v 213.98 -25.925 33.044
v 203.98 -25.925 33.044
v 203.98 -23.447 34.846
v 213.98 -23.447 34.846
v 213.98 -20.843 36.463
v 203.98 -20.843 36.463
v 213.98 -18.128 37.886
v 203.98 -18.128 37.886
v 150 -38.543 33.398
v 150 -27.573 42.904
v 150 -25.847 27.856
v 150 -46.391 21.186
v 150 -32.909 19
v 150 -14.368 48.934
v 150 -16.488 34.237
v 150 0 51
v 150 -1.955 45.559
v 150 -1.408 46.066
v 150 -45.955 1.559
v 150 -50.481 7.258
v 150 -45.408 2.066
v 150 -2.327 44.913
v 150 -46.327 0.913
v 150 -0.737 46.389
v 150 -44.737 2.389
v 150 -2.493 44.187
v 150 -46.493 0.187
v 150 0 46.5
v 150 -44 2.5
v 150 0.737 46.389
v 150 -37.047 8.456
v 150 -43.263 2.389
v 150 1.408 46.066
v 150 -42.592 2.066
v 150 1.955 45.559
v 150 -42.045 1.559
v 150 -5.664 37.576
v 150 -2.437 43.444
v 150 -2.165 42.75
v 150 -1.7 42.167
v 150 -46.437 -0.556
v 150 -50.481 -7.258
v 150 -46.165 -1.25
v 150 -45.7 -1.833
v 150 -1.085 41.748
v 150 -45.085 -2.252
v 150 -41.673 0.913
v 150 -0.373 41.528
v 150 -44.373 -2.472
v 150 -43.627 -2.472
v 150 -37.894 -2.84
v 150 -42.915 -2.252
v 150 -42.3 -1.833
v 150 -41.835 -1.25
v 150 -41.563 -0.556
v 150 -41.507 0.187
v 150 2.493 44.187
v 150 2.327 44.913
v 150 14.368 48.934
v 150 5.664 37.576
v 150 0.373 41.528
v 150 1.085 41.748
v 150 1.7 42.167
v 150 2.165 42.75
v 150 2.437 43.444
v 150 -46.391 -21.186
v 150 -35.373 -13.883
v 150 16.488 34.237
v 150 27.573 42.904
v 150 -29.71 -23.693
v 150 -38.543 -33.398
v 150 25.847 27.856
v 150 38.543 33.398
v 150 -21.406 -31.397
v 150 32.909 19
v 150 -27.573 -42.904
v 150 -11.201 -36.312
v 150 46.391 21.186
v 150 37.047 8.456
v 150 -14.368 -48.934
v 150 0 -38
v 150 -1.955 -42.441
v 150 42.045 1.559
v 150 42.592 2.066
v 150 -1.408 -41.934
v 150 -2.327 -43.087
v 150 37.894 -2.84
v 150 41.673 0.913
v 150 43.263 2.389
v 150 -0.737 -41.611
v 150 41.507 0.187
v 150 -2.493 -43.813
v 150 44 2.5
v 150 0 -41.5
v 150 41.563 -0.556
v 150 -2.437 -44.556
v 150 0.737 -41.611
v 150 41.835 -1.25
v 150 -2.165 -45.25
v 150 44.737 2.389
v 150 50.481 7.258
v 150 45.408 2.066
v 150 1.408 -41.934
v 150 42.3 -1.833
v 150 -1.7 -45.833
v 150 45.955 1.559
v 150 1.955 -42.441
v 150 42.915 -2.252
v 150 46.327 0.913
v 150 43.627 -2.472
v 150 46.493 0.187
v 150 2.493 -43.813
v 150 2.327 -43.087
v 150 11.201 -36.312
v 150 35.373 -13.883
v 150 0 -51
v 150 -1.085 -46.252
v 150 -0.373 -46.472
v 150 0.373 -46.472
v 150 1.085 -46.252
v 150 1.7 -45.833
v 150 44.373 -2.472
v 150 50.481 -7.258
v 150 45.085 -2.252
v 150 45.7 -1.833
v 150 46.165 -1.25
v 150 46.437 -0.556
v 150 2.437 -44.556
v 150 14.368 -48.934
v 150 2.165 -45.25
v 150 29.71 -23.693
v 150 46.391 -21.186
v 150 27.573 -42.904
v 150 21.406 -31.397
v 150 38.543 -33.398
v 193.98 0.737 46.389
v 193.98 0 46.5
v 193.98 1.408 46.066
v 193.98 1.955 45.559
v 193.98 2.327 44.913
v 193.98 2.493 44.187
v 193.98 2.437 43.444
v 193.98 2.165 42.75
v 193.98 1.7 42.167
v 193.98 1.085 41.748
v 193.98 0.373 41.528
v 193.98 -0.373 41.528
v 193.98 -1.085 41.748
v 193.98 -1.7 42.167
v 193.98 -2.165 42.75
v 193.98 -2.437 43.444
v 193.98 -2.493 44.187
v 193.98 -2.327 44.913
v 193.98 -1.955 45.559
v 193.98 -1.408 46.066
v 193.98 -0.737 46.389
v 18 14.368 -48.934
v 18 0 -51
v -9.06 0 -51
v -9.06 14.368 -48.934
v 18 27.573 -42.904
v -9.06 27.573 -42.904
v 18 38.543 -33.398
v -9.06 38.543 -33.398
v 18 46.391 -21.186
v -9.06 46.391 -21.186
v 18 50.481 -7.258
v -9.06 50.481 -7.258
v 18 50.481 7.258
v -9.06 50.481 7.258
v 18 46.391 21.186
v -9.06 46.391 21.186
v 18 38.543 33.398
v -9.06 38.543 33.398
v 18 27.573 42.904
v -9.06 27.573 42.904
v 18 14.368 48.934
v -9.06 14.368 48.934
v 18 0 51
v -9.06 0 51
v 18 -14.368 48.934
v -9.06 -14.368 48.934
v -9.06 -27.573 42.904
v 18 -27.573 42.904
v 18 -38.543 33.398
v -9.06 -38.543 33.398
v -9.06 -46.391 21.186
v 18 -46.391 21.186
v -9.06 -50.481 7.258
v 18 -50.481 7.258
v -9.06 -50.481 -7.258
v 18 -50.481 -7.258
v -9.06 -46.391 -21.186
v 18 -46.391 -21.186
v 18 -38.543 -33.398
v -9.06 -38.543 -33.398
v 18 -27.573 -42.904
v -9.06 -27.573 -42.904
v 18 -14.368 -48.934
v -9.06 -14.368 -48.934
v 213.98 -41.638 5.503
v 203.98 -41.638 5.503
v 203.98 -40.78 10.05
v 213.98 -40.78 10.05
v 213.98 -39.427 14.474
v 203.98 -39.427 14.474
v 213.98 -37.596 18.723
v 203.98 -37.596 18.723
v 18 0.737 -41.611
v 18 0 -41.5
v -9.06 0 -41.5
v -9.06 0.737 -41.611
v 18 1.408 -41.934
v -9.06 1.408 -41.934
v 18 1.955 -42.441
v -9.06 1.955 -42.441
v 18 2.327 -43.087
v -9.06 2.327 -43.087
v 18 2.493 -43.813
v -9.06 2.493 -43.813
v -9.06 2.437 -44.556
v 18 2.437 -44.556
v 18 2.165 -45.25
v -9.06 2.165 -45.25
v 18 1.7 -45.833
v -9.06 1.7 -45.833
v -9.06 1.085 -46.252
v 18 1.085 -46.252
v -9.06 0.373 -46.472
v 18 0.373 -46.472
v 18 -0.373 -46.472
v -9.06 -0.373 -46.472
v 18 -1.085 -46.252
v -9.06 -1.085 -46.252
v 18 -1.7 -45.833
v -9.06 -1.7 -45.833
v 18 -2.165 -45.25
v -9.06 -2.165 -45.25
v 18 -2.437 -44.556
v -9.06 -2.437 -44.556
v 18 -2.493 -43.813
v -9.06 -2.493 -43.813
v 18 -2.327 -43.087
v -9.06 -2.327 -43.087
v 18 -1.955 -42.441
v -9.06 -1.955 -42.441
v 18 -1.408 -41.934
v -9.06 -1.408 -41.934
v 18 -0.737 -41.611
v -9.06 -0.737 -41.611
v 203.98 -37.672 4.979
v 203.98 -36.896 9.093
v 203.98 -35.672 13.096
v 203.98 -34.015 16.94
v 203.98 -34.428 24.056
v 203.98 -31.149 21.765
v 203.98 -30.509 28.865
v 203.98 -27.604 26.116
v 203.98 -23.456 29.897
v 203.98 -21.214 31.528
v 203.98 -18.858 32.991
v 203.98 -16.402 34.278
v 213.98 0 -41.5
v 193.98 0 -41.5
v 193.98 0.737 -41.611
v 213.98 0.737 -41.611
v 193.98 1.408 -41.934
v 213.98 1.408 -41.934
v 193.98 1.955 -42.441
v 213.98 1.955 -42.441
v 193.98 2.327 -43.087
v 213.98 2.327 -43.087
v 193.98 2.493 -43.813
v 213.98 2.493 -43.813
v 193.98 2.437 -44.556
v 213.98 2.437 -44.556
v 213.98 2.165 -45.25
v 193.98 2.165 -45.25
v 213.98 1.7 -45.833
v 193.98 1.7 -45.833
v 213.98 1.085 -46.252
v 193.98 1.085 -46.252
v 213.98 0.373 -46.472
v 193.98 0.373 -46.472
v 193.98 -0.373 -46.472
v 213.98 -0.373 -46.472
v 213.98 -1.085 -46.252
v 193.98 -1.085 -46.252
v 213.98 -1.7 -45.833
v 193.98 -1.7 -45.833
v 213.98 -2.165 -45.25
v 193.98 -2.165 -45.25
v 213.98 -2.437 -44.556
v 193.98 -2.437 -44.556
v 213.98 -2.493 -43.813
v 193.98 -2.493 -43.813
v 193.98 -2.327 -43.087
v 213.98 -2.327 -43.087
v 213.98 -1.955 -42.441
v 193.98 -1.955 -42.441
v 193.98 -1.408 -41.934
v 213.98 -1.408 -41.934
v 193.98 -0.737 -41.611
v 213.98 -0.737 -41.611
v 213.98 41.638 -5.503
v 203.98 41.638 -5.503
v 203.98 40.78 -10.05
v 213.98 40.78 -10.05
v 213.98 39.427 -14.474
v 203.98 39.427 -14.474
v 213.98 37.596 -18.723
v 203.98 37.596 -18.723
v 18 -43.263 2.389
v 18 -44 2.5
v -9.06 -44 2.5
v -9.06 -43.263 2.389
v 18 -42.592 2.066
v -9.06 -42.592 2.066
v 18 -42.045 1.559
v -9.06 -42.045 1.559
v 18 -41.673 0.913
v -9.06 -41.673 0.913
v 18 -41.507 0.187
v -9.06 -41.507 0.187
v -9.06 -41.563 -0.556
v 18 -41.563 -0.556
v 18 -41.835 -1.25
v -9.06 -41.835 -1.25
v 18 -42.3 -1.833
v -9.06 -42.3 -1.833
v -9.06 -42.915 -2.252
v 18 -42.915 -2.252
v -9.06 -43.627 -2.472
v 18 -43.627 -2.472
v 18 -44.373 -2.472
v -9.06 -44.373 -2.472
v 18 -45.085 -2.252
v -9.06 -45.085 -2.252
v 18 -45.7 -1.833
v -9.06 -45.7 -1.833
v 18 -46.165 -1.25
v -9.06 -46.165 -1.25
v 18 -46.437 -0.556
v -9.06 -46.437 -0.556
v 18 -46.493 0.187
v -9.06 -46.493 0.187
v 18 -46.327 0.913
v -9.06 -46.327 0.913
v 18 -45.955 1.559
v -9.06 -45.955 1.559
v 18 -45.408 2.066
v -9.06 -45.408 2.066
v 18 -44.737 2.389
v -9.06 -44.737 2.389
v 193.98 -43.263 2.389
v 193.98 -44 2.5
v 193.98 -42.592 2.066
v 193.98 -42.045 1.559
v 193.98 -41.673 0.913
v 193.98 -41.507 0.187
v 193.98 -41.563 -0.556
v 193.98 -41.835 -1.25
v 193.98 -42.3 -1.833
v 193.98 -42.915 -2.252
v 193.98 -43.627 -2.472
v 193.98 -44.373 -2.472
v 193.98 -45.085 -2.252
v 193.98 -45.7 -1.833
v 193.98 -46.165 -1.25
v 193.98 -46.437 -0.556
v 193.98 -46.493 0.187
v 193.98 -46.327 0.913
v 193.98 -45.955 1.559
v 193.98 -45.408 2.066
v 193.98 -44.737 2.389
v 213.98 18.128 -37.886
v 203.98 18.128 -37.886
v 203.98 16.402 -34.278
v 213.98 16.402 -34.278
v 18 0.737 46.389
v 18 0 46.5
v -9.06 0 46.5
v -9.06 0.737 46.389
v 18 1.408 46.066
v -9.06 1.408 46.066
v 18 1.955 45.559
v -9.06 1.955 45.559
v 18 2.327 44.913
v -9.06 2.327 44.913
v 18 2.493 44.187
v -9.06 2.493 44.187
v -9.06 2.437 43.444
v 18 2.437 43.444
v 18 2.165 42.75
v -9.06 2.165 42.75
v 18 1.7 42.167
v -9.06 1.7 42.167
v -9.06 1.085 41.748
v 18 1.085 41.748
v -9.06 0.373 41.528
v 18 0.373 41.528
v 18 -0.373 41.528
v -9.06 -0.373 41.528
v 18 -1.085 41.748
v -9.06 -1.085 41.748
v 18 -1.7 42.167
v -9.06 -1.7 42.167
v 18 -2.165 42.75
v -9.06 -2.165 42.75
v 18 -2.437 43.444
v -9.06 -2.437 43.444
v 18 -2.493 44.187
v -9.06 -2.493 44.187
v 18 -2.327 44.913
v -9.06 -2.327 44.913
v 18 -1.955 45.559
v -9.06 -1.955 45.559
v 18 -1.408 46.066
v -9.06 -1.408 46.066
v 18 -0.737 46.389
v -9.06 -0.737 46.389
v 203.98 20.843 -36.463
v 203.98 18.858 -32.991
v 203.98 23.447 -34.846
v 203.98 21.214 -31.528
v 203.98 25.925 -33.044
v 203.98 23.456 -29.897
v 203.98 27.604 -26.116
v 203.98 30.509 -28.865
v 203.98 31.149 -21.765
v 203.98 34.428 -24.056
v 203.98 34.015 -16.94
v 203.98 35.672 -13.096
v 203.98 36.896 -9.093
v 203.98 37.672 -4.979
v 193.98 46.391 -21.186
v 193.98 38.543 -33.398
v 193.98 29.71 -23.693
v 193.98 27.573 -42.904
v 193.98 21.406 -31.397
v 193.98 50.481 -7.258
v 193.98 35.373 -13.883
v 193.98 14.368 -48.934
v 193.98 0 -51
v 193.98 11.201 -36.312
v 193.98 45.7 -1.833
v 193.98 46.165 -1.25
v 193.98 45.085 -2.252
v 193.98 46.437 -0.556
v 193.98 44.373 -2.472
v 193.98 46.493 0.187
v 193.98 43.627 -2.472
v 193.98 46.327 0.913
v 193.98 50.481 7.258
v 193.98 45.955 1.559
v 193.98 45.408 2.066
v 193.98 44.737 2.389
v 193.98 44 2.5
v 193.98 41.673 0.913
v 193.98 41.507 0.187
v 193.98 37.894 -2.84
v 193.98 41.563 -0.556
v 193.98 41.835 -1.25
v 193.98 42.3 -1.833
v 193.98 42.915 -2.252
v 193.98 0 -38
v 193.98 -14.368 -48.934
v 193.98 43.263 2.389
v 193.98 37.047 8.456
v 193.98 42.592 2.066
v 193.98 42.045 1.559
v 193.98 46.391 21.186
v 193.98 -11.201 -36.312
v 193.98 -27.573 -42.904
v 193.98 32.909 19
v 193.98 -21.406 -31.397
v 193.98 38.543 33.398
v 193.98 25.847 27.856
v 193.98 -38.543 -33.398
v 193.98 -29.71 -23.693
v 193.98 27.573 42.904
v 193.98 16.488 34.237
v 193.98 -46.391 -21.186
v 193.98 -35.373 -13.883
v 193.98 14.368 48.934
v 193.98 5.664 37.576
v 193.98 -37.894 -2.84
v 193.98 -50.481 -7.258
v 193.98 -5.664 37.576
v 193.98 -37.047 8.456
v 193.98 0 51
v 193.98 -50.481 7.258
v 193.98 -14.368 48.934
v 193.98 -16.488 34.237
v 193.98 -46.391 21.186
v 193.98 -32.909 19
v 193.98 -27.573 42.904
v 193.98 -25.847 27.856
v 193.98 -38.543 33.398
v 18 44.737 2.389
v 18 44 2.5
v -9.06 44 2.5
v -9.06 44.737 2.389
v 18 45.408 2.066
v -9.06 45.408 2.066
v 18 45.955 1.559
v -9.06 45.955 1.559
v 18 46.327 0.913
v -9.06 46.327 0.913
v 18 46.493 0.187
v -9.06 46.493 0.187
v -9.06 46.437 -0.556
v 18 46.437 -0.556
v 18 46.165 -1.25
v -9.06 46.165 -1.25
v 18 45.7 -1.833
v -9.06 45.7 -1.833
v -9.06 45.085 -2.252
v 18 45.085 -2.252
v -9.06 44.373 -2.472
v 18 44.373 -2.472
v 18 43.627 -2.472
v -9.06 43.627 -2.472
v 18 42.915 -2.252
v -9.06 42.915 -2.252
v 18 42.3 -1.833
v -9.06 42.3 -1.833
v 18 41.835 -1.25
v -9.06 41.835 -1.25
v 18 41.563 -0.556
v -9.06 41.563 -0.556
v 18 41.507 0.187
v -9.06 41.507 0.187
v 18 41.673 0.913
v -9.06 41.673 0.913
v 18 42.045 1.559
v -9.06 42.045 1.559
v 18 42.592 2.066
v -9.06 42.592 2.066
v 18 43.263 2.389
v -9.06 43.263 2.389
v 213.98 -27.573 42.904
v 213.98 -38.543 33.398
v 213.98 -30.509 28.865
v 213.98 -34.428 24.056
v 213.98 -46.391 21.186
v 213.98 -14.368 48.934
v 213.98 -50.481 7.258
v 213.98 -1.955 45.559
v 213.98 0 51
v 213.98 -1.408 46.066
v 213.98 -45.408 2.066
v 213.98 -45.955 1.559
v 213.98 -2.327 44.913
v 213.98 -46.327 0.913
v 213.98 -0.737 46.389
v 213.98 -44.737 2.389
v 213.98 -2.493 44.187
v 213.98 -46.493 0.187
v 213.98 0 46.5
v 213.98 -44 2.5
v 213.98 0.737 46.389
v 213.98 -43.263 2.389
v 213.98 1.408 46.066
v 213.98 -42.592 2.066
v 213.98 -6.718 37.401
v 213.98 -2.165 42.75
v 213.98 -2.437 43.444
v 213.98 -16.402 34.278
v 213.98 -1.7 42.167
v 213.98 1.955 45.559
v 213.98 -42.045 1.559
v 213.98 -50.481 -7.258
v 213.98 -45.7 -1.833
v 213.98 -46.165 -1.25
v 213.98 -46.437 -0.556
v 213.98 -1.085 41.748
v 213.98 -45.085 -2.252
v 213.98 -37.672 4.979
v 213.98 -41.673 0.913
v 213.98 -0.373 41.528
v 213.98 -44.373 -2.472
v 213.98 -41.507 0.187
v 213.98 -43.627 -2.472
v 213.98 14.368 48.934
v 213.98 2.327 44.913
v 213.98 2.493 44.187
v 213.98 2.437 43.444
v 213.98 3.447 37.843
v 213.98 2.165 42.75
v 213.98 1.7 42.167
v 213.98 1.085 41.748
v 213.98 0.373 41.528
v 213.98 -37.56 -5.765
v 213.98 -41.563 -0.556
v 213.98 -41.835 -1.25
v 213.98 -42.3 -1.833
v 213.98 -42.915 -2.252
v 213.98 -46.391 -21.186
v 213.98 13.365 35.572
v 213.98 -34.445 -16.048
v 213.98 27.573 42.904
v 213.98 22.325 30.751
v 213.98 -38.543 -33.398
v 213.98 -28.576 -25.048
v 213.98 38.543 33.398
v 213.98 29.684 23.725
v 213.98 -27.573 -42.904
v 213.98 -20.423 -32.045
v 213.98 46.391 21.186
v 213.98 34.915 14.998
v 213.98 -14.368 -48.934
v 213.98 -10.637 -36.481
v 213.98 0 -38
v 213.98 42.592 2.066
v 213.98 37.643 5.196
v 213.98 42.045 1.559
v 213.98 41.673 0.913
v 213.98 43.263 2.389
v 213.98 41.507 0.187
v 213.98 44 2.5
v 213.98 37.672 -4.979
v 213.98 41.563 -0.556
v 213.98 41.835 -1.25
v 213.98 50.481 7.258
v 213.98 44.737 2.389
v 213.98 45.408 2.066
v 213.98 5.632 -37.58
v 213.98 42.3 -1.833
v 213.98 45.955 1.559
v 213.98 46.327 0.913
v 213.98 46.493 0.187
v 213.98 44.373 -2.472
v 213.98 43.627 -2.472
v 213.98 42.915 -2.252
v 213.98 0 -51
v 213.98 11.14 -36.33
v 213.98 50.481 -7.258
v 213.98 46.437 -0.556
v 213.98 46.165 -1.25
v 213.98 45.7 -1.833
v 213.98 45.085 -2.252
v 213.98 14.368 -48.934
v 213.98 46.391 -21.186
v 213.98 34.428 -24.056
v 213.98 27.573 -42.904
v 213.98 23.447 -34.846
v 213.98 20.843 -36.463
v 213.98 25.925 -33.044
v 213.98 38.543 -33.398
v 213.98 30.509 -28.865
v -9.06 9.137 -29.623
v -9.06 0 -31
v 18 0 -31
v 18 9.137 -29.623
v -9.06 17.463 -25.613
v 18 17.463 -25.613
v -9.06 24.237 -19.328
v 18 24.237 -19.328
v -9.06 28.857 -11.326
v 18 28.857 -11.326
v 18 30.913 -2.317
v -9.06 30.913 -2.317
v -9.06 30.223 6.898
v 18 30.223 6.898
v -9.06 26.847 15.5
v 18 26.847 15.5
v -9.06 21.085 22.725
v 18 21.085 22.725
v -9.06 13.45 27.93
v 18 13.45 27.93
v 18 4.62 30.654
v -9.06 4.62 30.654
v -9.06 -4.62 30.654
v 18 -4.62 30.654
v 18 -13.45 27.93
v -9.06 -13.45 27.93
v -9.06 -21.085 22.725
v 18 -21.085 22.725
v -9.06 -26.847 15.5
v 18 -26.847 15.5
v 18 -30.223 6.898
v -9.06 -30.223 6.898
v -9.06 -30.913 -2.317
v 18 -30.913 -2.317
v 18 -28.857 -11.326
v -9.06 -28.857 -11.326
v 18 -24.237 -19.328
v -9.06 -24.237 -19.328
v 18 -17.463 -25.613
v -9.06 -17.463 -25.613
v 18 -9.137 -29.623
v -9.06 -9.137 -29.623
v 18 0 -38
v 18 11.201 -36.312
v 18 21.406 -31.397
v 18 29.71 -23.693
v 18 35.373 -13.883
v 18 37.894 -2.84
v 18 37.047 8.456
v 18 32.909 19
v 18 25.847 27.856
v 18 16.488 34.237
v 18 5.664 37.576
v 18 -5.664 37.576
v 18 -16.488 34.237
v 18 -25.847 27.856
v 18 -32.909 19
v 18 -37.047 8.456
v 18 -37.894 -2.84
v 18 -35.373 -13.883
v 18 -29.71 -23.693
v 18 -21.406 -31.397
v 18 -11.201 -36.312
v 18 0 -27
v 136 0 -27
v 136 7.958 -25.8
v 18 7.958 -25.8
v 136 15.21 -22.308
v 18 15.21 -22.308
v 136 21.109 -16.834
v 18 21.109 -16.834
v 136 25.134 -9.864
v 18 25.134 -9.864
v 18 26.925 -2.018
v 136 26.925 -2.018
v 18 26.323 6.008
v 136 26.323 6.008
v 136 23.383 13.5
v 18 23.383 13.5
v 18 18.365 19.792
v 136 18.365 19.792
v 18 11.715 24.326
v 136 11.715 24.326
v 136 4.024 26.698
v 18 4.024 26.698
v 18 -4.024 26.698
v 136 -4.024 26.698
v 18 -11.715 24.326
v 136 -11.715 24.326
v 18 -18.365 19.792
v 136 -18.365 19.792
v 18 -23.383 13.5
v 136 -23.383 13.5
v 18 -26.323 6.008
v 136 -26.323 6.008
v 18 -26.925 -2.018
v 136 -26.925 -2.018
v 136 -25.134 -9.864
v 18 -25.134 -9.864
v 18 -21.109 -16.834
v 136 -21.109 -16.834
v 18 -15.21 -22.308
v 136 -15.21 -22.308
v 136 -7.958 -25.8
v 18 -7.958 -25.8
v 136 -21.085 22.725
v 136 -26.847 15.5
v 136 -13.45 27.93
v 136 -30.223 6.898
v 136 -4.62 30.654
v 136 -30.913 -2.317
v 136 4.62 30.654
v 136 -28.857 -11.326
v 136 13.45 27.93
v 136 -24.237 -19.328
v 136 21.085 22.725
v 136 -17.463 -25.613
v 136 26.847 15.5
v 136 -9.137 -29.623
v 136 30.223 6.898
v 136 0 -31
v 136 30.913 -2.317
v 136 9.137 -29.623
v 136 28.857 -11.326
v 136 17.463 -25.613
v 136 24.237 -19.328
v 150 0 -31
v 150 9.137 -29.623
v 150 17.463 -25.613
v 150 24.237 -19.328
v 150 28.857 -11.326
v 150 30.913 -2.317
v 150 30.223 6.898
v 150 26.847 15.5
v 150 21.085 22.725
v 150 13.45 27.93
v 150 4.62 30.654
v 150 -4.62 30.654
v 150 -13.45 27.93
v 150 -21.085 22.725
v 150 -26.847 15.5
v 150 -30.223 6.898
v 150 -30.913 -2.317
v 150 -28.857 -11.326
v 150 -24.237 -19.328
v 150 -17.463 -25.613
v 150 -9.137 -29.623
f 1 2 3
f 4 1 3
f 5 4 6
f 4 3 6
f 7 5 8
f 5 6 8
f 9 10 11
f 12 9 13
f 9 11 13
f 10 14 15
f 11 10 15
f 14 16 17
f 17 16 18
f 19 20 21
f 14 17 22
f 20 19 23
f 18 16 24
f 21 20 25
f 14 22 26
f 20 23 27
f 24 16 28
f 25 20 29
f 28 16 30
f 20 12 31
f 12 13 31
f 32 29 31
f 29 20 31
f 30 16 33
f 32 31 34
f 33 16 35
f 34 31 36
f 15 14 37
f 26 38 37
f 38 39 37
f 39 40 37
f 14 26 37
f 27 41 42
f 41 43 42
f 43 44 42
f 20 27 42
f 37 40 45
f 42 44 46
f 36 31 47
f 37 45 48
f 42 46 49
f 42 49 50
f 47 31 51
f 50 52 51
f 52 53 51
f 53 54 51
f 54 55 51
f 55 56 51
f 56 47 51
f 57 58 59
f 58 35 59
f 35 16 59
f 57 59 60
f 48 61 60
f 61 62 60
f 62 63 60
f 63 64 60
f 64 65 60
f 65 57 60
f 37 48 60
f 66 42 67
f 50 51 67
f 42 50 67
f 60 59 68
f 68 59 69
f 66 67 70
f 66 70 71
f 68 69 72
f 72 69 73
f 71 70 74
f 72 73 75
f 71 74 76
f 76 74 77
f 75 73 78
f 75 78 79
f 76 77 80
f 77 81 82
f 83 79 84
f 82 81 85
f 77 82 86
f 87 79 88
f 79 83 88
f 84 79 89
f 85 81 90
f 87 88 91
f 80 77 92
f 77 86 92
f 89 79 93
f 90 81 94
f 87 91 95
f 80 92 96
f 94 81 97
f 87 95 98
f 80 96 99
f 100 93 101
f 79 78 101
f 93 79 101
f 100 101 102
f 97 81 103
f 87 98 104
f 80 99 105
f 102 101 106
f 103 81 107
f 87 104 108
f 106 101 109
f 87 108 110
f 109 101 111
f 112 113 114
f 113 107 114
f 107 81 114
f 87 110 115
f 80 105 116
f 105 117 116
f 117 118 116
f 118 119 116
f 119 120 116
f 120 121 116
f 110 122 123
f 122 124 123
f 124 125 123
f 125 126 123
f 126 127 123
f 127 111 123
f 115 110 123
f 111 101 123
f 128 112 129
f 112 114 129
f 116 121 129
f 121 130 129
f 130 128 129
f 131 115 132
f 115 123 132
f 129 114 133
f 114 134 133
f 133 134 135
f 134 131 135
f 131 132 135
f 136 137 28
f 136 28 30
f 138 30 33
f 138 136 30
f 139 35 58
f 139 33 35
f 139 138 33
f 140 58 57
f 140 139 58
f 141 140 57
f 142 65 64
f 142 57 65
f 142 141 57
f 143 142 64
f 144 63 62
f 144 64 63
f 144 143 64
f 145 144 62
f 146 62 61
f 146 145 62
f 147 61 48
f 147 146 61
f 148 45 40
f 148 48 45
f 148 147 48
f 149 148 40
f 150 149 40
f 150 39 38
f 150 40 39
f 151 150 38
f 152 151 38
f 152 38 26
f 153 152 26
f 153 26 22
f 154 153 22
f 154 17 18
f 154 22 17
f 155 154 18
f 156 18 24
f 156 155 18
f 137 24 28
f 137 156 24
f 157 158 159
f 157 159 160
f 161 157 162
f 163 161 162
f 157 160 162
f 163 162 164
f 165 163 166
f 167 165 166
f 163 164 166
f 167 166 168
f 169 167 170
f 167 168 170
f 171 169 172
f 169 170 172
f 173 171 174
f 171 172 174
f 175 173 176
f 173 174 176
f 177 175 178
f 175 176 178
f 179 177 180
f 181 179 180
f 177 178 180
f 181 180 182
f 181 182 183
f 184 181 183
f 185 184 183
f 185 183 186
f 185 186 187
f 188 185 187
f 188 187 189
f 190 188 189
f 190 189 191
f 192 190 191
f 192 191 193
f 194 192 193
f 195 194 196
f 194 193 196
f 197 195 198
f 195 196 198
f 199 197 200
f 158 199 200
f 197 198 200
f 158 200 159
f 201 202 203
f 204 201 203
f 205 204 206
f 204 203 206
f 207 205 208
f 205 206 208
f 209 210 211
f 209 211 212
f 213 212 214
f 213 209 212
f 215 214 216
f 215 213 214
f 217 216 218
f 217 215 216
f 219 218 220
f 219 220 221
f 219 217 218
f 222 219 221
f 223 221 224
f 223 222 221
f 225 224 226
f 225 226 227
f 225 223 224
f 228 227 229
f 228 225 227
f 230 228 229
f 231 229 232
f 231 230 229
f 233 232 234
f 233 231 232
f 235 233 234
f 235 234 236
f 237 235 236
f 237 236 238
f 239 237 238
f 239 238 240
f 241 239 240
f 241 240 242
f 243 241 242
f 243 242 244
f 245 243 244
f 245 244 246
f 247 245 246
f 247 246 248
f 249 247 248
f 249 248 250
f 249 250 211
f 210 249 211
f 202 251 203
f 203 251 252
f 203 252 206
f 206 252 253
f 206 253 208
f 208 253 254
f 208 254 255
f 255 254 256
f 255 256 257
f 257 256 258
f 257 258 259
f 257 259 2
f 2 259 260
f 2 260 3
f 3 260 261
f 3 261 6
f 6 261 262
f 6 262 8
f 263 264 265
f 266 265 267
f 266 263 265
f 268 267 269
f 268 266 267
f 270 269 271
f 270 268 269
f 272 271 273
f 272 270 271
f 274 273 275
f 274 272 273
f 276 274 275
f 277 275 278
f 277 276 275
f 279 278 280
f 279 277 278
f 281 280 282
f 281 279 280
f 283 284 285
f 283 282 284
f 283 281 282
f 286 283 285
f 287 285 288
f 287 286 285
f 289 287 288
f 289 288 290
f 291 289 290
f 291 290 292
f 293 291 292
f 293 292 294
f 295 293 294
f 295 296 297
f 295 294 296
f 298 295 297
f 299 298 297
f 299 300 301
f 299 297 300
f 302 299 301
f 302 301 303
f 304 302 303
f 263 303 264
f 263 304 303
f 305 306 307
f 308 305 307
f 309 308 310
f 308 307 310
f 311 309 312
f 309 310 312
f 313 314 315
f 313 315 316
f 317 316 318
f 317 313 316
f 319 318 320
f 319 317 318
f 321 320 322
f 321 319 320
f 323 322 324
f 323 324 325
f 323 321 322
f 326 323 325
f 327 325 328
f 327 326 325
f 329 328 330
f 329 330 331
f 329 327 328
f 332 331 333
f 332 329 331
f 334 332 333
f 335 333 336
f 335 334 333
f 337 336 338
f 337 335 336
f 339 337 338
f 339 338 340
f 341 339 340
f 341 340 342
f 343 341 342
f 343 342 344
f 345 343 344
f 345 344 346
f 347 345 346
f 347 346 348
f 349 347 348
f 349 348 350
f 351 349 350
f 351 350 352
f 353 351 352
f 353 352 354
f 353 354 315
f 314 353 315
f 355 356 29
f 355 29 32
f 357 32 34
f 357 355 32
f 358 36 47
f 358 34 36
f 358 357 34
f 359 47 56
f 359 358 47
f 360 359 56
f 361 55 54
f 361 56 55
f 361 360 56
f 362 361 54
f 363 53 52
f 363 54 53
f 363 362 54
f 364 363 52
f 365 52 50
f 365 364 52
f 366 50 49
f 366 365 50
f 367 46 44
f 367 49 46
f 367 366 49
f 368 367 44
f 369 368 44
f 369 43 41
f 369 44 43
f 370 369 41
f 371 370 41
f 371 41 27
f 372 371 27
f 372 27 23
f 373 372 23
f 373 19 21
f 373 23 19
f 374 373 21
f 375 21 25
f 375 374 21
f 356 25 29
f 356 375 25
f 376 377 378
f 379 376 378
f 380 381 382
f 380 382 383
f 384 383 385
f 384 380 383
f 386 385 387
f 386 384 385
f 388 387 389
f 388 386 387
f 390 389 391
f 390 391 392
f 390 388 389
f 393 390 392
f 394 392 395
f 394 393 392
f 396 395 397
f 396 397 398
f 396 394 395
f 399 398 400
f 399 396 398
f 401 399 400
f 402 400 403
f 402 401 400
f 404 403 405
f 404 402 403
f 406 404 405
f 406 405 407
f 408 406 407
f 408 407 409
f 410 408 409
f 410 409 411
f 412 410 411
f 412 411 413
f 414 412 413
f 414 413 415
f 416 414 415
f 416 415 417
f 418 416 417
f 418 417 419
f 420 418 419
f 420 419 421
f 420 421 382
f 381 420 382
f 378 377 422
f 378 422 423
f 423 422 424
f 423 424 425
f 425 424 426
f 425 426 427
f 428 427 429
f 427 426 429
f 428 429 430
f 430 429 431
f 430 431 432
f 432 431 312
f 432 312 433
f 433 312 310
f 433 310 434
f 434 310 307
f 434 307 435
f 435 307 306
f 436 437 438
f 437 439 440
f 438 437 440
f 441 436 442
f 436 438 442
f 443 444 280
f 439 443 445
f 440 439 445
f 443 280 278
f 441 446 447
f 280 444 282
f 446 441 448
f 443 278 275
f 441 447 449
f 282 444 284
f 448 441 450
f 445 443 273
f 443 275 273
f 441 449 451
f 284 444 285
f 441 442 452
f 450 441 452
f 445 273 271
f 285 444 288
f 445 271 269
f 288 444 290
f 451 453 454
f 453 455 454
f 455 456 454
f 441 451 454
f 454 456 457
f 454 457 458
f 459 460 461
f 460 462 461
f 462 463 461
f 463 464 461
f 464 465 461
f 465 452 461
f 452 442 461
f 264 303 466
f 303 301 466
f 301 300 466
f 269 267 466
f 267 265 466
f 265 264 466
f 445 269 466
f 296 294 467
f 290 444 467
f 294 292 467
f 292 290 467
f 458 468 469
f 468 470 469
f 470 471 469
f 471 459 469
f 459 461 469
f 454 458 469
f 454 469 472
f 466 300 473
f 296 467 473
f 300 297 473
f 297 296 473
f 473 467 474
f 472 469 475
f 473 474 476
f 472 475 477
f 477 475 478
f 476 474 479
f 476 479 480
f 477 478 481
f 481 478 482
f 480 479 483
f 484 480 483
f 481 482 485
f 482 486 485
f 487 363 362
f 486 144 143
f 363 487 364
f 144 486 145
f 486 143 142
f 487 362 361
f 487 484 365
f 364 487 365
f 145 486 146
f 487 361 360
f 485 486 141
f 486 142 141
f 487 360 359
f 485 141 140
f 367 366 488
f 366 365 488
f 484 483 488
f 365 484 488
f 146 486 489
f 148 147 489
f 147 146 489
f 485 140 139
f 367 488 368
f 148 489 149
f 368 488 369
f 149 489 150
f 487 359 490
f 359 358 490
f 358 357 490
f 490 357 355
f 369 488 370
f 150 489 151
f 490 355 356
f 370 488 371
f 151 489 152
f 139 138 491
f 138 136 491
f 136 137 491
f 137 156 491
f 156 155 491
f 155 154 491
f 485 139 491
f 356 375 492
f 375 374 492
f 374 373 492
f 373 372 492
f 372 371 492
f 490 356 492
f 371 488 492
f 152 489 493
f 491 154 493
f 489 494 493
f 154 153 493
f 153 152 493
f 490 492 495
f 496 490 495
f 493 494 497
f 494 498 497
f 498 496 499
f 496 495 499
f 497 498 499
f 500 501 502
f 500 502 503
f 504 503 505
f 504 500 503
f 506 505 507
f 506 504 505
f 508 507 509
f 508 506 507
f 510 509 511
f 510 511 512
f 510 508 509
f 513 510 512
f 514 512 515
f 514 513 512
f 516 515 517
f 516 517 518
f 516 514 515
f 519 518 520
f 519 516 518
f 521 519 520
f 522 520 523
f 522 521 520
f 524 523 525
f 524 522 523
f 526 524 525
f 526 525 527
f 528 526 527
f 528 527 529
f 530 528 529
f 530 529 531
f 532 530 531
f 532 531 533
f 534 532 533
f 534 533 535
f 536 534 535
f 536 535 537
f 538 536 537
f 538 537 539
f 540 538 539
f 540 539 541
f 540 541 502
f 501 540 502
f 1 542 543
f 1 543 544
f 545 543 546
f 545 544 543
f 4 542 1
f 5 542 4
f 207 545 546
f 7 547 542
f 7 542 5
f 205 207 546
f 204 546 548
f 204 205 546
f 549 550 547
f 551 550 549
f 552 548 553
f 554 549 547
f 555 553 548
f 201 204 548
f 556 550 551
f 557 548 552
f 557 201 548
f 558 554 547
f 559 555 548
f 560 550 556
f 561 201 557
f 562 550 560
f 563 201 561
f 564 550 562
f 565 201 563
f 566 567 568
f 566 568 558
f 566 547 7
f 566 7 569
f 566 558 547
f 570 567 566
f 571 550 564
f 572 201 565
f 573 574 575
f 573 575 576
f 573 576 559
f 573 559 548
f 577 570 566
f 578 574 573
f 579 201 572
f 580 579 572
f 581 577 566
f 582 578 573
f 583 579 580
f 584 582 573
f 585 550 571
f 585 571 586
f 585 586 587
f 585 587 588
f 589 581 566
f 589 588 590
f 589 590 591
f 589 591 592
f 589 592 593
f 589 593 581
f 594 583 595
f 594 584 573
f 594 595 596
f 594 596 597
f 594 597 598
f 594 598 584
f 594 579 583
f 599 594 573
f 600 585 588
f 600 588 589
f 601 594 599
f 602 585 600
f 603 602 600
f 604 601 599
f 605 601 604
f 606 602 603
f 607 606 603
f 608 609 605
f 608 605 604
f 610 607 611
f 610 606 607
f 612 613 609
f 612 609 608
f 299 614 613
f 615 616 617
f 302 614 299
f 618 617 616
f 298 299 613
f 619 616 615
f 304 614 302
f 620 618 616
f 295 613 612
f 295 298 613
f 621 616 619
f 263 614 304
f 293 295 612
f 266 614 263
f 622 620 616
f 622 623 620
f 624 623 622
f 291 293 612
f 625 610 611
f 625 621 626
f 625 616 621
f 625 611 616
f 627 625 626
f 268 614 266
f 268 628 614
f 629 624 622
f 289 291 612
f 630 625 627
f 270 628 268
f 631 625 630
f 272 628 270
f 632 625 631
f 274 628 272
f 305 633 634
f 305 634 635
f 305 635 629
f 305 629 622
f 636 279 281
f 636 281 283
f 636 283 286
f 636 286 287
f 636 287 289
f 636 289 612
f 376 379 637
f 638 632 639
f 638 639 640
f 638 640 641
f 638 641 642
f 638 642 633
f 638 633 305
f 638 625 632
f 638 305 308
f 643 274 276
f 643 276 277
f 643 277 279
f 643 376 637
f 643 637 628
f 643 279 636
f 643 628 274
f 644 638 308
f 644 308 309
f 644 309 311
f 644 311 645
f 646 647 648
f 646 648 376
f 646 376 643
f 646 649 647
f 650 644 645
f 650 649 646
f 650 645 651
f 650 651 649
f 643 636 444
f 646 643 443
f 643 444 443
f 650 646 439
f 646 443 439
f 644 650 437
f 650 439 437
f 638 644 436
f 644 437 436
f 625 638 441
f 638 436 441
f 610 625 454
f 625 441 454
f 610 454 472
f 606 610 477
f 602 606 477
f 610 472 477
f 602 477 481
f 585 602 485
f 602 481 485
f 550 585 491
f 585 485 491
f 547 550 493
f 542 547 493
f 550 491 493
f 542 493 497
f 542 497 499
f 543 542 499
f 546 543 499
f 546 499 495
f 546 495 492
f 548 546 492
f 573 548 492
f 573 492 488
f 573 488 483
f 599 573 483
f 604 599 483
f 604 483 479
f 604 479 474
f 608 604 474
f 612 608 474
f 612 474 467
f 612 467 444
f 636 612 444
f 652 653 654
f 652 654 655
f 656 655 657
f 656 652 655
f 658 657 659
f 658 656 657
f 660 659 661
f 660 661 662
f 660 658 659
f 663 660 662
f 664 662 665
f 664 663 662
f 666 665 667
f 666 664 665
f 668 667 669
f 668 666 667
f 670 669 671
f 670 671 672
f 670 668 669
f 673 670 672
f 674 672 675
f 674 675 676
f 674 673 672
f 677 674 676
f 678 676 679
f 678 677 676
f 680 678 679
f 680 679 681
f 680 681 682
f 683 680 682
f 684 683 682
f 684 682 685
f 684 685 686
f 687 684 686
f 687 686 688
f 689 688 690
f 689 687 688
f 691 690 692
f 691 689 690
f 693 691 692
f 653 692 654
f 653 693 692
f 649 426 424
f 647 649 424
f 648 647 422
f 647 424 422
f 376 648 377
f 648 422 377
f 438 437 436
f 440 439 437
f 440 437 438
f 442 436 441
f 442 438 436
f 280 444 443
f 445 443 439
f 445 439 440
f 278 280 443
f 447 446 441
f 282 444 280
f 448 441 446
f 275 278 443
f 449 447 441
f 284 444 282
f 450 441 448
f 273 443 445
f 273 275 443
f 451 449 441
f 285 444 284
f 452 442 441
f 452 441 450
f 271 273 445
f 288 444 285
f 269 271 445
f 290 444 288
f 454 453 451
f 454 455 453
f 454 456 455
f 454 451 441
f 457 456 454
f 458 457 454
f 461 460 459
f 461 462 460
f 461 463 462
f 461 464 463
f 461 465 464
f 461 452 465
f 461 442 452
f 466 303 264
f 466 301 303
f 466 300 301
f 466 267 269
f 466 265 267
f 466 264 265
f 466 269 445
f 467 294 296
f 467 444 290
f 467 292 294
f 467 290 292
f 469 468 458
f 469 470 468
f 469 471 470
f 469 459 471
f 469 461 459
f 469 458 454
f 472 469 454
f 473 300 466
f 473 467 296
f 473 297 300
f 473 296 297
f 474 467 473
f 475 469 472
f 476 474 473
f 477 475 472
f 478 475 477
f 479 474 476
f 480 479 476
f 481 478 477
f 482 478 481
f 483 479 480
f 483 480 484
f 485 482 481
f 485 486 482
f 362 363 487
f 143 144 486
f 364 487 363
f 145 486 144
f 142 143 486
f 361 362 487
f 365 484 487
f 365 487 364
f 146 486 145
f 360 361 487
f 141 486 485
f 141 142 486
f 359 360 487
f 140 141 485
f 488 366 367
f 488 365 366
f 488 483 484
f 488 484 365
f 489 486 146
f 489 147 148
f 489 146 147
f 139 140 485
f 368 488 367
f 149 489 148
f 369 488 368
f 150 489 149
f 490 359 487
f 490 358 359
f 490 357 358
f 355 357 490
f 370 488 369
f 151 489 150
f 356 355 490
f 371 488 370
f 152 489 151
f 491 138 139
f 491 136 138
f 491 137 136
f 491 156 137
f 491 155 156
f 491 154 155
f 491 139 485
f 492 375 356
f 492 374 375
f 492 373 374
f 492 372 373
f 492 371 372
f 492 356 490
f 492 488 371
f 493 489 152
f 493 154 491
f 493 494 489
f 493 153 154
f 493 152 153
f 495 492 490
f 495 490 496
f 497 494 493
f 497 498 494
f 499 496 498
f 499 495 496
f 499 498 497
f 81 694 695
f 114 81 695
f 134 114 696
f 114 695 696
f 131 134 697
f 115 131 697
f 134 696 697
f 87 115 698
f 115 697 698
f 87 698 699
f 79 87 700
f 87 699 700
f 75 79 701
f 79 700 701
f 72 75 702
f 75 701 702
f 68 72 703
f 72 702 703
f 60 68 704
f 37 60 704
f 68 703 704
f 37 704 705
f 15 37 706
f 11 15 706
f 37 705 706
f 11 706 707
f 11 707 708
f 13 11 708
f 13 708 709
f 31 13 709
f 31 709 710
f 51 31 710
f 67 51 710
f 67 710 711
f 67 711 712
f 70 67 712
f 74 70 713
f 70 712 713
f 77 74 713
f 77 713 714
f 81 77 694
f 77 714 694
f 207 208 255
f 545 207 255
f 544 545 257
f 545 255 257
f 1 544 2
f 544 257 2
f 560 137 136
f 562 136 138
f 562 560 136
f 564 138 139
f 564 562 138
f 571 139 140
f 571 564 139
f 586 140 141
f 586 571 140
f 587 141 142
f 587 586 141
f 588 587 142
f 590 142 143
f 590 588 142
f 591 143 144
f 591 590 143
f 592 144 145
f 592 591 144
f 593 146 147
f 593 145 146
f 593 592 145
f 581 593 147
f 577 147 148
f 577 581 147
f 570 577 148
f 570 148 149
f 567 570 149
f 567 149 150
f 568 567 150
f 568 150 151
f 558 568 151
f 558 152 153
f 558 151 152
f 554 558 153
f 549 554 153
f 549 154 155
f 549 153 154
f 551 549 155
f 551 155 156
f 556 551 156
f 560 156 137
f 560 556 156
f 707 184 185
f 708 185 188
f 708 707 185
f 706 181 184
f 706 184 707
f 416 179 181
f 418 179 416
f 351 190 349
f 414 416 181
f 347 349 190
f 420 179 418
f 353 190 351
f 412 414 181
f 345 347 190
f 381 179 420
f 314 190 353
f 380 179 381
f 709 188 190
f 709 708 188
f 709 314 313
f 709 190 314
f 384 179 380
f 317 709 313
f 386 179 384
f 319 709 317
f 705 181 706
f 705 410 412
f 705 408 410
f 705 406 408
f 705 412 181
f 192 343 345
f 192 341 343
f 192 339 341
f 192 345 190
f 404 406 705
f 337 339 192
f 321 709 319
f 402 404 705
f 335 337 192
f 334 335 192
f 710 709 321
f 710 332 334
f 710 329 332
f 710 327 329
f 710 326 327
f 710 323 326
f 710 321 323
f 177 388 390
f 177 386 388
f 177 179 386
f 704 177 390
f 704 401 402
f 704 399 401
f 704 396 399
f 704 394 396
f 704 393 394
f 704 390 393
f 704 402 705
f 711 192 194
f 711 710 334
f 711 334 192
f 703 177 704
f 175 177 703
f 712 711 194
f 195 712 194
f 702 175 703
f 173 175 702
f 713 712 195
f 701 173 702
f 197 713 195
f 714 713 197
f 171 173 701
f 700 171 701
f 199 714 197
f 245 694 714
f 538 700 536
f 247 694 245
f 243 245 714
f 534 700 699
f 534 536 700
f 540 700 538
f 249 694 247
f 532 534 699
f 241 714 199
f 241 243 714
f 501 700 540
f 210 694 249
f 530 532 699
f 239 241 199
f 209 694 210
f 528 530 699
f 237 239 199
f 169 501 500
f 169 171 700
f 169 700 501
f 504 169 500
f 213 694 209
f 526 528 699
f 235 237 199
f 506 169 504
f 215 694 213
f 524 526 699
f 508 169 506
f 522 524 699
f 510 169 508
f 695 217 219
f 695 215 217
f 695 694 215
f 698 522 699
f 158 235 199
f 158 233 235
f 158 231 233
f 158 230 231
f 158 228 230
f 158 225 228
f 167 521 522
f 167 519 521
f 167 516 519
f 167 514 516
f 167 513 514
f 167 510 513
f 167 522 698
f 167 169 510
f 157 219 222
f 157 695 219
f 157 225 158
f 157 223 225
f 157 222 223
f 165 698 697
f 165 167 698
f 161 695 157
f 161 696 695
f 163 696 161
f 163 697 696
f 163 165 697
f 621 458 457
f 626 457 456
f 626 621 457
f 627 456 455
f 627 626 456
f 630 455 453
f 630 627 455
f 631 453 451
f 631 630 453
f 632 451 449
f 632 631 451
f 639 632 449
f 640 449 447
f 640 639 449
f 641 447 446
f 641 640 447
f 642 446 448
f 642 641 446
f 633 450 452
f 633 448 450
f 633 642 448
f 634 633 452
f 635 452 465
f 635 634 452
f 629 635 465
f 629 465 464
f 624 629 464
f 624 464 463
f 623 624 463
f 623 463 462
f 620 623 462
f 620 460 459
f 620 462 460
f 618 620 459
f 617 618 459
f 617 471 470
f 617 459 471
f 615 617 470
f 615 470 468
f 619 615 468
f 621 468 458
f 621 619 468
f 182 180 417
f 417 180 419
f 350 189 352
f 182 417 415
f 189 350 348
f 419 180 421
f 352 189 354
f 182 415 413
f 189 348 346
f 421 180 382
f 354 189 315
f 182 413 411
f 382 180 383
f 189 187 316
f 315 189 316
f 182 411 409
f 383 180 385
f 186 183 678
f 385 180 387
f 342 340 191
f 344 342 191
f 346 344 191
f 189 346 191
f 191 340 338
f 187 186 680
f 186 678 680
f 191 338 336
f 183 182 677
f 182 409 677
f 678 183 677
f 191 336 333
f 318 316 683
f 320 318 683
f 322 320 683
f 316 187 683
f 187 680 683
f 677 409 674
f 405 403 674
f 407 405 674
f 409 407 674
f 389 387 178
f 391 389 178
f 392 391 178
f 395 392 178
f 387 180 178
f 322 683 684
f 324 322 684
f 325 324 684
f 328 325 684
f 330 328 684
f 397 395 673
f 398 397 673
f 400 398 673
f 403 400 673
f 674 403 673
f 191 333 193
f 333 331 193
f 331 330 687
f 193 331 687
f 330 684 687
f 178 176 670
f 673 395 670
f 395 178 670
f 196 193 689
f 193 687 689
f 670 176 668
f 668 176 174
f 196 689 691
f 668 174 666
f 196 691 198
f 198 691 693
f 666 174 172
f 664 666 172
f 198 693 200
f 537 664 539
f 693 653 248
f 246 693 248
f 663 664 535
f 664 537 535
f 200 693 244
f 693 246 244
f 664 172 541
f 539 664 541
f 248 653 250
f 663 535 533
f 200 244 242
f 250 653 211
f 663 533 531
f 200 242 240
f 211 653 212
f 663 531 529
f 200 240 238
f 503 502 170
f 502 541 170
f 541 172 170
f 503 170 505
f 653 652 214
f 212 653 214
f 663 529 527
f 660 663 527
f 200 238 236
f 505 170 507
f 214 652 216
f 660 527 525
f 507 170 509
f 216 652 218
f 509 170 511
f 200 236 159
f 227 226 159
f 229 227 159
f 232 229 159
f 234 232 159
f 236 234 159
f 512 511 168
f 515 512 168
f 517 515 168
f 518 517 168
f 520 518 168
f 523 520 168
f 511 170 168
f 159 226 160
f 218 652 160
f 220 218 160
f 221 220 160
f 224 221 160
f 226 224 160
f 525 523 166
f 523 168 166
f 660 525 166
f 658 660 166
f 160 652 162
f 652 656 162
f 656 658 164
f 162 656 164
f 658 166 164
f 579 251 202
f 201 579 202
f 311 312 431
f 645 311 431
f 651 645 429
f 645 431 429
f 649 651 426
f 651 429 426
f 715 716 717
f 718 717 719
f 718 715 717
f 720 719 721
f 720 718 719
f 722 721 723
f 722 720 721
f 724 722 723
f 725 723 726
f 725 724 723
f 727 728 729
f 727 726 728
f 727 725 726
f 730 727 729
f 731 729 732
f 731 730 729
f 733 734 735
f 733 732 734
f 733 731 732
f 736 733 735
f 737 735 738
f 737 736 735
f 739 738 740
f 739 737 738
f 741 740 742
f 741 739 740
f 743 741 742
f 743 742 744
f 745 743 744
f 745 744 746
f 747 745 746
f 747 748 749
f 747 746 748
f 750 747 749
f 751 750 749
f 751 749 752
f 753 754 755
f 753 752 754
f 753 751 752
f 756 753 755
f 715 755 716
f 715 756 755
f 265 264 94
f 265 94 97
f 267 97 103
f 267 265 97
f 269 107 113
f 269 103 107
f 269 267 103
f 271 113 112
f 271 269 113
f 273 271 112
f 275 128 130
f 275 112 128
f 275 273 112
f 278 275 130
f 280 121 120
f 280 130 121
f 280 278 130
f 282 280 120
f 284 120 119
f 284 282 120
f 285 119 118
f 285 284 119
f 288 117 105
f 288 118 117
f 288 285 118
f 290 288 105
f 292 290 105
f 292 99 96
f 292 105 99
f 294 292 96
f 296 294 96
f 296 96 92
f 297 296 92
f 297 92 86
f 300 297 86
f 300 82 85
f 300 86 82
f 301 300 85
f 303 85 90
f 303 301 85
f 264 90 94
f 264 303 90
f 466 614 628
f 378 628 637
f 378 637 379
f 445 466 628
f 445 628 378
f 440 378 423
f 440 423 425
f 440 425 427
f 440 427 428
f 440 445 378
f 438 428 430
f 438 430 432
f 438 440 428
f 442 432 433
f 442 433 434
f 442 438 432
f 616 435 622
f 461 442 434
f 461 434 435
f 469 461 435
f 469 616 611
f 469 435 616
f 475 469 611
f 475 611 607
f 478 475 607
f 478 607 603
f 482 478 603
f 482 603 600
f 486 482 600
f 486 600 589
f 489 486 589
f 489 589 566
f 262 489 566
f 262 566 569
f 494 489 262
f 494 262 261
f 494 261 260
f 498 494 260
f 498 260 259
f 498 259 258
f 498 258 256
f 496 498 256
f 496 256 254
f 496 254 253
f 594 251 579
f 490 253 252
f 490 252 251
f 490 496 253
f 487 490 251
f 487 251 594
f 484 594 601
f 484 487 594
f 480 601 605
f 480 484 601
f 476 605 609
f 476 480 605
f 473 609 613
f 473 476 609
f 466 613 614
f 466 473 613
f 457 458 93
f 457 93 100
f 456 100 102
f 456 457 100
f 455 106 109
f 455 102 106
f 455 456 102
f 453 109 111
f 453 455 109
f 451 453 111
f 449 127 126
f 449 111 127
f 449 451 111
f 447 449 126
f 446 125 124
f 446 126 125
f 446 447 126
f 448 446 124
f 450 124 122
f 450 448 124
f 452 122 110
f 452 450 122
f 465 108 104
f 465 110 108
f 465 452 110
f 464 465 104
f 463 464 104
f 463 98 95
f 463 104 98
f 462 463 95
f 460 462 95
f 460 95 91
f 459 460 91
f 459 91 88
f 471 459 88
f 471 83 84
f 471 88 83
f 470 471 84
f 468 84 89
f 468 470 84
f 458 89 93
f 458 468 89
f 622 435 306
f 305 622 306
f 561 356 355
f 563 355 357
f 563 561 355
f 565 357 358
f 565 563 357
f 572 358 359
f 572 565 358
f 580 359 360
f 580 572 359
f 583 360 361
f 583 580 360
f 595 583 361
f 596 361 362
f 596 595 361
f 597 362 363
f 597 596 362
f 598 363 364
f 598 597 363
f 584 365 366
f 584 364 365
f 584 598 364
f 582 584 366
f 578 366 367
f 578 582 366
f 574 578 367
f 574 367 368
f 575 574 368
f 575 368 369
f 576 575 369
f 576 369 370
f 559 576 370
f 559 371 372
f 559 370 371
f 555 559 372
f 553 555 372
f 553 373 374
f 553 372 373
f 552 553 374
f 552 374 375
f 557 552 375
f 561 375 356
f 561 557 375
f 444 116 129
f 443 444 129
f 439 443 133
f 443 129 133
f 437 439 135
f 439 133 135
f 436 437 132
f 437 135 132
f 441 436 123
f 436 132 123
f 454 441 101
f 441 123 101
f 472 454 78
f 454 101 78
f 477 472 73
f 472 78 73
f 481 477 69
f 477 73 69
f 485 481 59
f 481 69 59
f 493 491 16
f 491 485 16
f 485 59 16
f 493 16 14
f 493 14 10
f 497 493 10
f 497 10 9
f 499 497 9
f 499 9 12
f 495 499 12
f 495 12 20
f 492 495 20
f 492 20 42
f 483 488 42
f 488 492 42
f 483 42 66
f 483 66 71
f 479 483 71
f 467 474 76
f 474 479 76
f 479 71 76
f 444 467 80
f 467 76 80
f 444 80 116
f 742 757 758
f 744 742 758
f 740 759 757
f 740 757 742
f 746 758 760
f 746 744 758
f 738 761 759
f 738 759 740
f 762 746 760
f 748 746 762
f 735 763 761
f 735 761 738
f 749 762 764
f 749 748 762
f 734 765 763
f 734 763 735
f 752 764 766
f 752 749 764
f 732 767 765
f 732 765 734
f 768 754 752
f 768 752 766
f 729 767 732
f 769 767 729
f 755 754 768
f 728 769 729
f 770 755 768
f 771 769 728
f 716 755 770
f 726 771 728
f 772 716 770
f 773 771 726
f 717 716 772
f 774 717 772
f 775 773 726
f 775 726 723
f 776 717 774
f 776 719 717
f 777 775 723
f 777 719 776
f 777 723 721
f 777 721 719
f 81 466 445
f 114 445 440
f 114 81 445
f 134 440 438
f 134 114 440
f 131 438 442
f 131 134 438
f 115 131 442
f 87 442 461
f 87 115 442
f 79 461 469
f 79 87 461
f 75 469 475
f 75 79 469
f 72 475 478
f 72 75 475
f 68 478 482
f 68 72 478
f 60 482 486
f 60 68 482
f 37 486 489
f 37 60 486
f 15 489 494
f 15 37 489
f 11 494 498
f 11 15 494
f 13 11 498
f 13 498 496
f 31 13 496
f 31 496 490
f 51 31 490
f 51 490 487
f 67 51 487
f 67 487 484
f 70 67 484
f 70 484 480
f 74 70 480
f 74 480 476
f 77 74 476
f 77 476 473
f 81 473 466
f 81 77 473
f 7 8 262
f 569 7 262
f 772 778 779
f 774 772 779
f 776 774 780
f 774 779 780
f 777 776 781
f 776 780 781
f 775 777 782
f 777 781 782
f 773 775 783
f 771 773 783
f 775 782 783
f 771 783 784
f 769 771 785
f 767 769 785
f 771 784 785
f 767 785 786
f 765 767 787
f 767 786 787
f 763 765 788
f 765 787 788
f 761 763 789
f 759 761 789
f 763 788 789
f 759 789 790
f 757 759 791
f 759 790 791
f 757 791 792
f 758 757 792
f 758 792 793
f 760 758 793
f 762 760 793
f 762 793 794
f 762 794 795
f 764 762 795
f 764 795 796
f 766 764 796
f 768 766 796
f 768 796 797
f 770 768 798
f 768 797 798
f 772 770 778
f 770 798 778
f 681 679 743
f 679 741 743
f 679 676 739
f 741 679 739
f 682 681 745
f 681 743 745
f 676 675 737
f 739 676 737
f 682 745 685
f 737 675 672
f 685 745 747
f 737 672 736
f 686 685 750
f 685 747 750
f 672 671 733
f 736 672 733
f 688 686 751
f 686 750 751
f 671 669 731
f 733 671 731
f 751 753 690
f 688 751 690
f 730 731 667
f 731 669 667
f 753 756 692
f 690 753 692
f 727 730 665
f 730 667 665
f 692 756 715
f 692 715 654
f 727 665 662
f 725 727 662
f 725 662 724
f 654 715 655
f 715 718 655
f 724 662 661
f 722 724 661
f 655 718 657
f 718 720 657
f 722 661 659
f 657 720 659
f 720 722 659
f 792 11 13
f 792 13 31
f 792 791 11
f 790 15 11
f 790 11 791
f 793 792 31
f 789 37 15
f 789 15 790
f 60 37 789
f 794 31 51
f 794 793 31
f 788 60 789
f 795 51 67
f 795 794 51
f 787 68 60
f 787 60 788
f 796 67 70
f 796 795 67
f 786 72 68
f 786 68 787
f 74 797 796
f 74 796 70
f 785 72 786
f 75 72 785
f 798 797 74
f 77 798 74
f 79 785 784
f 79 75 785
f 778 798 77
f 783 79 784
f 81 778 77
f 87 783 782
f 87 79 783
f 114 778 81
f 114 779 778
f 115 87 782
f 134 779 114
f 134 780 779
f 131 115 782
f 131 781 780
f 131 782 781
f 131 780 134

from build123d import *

# Parameters (mm, degrees)
EXTRUDE_1_DEPTH      = 18
EXTRUDE_1_DEPTH_BACK = 9.06
SKETCH_1_R           = 51
SKETCH_1_R_2         = 31
SKETCH_2_R           = 38
SKETCH_2_R_2         = 27
EXTRUDE_2_DEPTH      = 132
SKETCH_3_R           = 51
SKETCH_3_R_2         = 38
EXTRUDE_3_DEPTH      = 63.98
CUT_EXTRUDE_START    = -223.04
SKETCH_4_R           = 2.5
CUT_EXTRUDE_1_DEPTH  = 223.04
CUT_EXTRUDE_START_2  = -10
CUT_EXTRUDE_2_DEPTH  = 10
SKETCH_6_R           = 31
CUT_EXTRUDE_3_DEPTH  = 14


with BuildPart() as part:
    # 草图1 → 凸台-拉伸1 (new, two sides: drawn at the far end of the back side and taken through both)
    with BuildSketch(Plane(origin=(0, 0, 0), x_dir=(0, 0, -1), z_dir=(1, 0, 0)).offset(-EXTRUDE_1_DEPTH_BACK)):
        Circle(SKETCH_1_R)
        Circle(SKETCH_1_R_2, mode=Mode.SUBTRACT)
    extrude(amount=EXTRUDE_1_DEPTH + EXTRUDE_1_DEPTH_BACK)

    # 草图2 → 凸台-拉伸2 (add)
    with BuildSketch(Plane(origin=(18, 0, 0), x_dir=(0, 0, -1), z_dir=(1, 0, 0))):
        Circle(SKETCH_2_R)
        Circle(SKETCH_2_R_2, mode=Mode.SUBTRACT)
    extrude(amount=EXTRUDE_2_DEPTH)


with BuildPart() as body_2:
    # 草图3 → 凸台-拉伸3 (new body)
    with BuildSketch(Plane(origin=(150, 0, 0), x_dir=(0, 0, -1), z_dir=(1, 0, 0))):
        Circle(SKETCH_3_R)
        Circle(SKETCH_3_R_2, mode=Mode.SUBTRACT)
    extrude(amount=EXTRUDE_3_DEPTH)


with BuildPart() as cut_extrude_1_tool:
    # 草图4 → 切除-拉伸1 (new body)
    with BuildSketch(Plane.ZY.offset(9.06).offset(CUT_EXTRUDE_START)):
        with Locations((0, 44)):
            Circle(SKETCH_4_R)
        with Locations((44, 0)):
            Circle(SKETCH_4_R)
        with Locations((0, -44)):
            Circle(SKETCH_4_R)
        with Locations((-44, 0)):
            Circle(SKETCH_4_R)
    extrude(amount=CUT_EXTRUDE_1_DEPTH)


with BuildPart() as part_1:
    add(part.part)

    # 切除-拉伸1: cut by cut_extrude_1_tool
    add(cut_extrude_1_tool.part, mode=Mode.SUBTRACT)

    # 草图6 → 切除-拉伸3 (cut)
    with BuildSketch(Plane(origin=(150, 0, 0), x_dir=(0, 0, -1), z_dir=(1, 0, 0))):
        Circle(SKETCH_6_R)
    extrude(amount=-CUT_EXTRUDE_3_DEPTH, mode=Mode.SUBTRACT)


with BuildPart() as body_2_1:
    add(body_2.part)

    # 切除-拉伸1: cut by cut_extrude_1_tool
    add(cut_extrude_1_tool.part, mode=Mode.SUBTRACT)

    # 草图5 → 切除-拉伸2 (cut)
    with BuildSketch(Plane(origin=(213.98, 0, 0), x_dir=(0, 0, -1), z_dir=(1, 0, 0)).offset(CUT_EXTRUDE_START_2)):
        with BuildLine():
            Line((4.979052634, 37.672390883), (5.503163437, 41.637905713))
            ThreePointArc((5.503163437, 41.637905713), (12.280668917, 40.16447648), (18.723271545, 37.595732506))
            ThreePointArc((18.723271545, 37.595732506), (26.533013809, 32.557628572), (33.043562457, 25.925334717))
            ThreePointArc((33.043562457, 25.925334717), (35.678505016, 22.159518943), (37.886189575, 18.128338023))
            Line((37.886189575, 18.128338023), (34.277981044, 16.40182964))
            ThreePointArc((34.277981044, 16.40182964), (32.280552158, 20.049088568), (29.896556508, 23.45625522))
            ThreePointArc((29.896556508, 23.45625522), (24.006060113, 29.456902041), (16.940102827, 34.015186553))
            ThreePointArc((16.940102827, 34.015186553), (11.111081401, 36.339288244), (4.979052634, 37.672390883))
        make_face()
        with BuildLine():
            Line((-4.979052634, -37.672390883), (-5.503163437, -41.637905713))
            ThreePointArc((-5.503163437, -41.637905713), (-12.280668917, -40.16447648), (-18.723271545, -37.595732506))
            ThreePointArc((-18.723271545, -37.595732506), (-26.533013809, -32.557628572), (-33.043562457, -25.925334717))
            ThreePointArc((-33.043562457, -25.925334717), (-35.678505016, -22.159518943), (-37.886189575, -18.128338023))
            Line((-37.886189575, -18.128338023), (-34.277981044, -16.40182964))
            ThreePointArc((-34.277981044, -16.40182964), (-32.280552158, -20.049088568), (-29.896556508, -23.45625522))
            ThreePointArc((-29.896556508, -23.45625522), (-24.006060113, -29.456902041), (-16.940102827, -34.015186553))
            ThreePointArc((-16.940102827, -34.015186553), (-11.111081401, -36.339288244), (-4.979052634, -37.672390883))
        make_face()
    extrude(amount=CUT_EXTRUDE_2_DEPTH, mode=Mode.SUBTRACT)


with BuildPart() as body_3:
    # Split Bodies 1: the piece on the far side of the plane
    add(body_2_1.part)
    split(bisect_by=Plane(origin=(193.98, 0, 0), x_dir=(0, 0, 1), z_dir=(1, 0, 0)), keep=Keep.BOTTOM)


with BuildPart() as body_2_2:
    add(body_2_1.part)

    # Split Bodies 1
    split(bisect_by=Plane(origin=(193.98, 0, 0), x_dir=(0, 0, 1), z_dir=(1, 0, 0)), keep=Keep.TOP)


solid = Compound([part_1.part, body_3.part, body_2_2.part])
